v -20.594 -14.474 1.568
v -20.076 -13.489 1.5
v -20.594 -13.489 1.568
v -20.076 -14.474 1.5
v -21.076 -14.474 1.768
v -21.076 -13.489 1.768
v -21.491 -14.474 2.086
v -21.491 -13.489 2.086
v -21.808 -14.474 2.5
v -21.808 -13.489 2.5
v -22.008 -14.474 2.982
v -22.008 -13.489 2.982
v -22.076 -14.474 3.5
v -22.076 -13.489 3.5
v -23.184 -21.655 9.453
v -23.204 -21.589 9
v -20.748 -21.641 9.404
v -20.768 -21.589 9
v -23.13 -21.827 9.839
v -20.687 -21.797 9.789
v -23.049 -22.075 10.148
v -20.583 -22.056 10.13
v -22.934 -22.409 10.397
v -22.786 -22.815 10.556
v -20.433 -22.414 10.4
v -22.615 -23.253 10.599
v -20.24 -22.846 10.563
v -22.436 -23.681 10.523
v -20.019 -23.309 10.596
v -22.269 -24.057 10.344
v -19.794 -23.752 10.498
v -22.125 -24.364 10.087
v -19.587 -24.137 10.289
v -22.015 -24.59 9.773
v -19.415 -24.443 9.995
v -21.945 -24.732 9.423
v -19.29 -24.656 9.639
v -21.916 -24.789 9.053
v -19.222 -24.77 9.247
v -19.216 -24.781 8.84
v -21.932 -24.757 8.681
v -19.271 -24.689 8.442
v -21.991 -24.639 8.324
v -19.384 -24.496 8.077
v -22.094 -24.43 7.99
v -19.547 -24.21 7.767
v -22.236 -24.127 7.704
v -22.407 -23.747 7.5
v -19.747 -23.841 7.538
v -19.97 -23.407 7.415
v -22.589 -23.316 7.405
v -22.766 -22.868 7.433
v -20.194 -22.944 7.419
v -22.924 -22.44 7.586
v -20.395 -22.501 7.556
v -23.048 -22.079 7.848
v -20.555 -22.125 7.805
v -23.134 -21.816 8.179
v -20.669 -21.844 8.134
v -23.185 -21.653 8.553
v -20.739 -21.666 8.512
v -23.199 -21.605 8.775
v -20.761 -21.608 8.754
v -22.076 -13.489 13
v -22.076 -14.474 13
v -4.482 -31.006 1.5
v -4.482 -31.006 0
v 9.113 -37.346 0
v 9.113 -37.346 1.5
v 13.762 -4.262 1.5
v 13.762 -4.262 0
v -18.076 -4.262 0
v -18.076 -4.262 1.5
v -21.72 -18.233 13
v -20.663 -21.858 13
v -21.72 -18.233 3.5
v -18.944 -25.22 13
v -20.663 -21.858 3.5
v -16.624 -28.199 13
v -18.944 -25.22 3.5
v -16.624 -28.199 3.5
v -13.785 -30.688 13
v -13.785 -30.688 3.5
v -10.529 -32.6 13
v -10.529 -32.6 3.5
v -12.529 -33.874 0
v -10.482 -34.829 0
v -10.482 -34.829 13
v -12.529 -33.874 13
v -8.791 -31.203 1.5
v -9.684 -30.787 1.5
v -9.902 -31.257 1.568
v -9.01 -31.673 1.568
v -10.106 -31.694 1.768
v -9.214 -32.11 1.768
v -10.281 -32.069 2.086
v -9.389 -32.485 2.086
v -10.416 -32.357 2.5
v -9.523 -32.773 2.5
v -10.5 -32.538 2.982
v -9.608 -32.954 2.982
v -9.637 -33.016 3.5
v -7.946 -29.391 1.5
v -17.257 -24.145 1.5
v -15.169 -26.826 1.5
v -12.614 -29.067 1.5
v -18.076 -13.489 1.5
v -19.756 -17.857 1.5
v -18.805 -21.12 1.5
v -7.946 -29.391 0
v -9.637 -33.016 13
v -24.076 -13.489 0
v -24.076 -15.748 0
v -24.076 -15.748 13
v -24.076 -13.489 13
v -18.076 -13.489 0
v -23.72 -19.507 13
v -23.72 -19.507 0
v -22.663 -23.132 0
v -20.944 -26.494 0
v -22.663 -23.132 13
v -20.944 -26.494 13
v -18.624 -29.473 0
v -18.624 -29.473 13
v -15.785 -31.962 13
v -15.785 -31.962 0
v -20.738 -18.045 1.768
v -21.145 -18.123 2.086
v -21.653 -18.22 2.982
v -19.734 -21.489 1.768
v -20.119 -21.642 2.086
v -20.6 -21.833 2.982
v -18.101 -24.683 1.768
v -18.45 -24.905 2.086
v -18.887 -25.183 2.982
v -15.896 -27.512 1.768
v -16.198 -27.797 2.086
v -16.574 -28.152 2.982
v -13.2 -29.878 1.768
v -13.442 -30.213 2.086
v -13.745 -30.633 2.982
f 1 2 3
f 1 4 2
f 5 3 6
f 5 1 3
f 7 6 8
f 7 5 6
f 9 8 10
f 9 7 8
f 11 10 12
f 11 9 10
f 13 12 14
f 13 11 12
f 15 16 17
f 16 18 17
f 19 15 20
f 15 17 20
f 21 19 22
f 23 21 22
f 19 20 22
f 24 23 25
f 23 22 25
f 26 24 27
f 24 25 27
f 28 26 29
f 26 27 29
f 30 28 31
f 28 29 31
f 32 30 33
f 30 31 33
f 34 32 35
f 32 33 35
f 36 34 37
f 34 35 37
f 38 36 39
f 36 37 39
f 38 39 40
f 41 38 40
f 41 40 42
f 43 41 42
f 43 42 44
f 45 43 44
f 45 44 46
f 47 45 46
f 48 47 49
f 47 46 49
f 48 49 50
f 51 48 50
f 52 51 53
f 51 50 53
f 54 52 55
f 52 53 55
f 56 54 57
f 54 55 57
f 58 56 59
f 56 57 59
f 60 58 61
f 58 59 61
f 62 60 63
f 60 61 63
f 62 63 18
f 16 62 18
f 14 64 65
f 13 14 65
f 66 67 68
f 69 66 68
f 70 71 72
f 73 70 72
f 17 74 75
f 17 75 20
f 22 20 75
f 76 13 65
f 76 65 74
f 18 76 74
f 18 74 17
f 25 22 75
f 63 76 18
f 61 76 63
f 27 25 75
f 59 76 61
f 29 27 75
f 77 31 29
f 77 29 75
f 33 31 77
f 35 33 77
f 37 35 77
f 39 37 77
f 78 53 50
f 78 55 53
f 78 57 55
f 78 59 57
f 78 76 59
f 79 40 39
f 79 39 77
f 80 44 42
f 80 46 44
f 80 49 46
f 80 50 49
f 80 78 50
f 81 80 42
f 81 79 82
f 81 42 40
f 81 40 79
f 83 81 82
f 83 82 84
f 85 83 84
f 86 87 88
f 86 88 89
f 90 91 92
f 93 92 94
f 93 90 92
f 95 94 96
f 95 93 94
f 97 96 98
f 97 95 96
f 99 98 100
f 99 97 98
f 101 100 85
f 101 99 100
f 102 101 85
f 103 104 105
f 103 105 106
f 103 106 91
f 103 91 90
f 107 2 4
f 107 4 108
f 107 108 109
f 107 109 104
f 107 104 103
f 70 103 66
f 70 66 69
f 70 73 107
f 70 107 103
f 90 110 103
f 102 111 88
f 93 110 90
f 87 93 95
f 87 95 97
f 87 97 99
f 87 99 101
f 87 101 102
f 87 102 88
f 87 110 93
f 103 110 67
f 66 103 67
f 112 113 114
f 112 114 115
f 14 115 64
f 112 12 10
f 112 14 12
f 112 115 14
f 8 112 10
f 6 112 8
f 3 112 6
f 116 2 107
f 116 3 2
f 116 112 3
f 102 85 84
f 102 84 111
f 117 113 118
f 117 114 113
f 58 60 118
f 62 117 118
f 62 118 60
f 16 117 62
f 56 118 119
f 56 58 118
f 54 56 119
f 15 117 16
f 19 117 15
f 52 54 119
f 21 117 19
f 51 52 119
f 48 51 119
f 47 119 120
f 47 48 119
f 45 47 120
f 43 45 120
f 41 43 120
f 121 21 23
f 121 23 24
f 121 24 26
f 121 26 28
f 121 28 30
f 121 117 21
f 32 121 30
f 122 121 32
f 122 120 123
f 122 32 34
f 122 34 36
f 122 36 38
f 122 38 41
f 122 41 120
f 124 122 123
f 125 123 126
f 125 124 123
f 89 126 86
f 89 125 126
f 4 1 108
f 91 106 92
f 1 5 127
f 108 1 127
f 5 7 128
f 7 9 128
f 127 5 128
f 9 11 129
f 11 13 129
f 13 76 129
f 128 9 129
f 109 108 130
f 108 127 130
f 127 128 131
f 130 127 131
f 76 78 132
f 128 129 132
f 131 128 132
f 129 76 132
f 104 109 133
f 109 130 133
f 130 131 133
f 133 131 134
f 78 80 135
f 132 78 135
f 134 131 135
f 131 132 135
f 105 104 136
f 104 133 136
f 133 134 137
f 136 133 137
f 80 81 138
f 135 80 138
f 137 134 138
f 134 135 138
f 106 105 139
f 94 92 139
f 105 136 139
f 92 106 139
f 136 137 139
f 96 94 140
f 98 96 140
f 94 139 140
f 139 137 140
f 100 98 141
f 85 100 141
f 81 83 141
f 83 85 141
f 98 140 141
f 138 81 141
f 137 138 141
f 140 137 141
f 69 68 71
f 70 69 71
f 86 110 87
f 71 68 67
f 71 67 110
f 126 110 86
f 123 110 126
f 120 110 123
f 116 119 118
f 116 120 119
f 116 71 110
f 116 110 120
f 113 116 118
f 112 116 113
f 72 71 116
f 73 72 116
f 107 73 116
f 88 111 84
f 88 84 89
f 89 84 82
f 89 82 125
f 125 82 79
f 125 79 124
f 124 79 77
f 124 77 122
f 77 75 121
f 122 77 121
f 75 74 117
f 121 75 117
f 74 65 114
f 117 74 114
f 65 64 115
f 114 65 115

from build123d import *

# Parameters (mm, degrees)
BOSS_EXTRUDE1_DEPTH = 1.5
BOSS_EXTRUDE2_DEPTH = 13
CUT_EXTRUDE3_DEPTH  = 11.5
FILLET7_R           = 20
FILLET8_R           = 2
SKETCH5_R           = 1.6
CUT_EXTRUDE4_DEPTH  = 5.75


with BuildPart() as part:
    # Sketch1 → Boss-Extrude1 (new body)
    with BuildSketch(Plane.XY):
        Polygon((-4.481783153, -31.006256204), (9.112833652, -37.34553013), (13.762412955, -4.262054337), (-18.076399959, -4.262054337), (-18.076399959, -9.666982278), (-18.076399959, -24.666982278), align=None)
    extrude(amount=BOSS_EXTRUDE1_DEPTH)

    # Sketch2 → Boss-Extrude2 (add)
    with BuildSketch(Plane(origin=(0, 0, 0), x_dir=(-1, 0, 0), z_dir=(0, 0, -1))):
        Polygon((24.076399959, -28.489403843), (24.076399959, -13.489403843), (17.076399959, -13.489403843), (17.076399959, -24.029912017), (7.523455321, -28.48452326), (10.481783153, -34.828677769), align=None)
    extrude(amount=-BOSS_EXTRUDE2_DEPTH)

    # Sketch4 → Cut-Extrude3 (cut)
    with BuildSketch(Plane.XY.offset(13)):
        Polygon((-17.076399959, -13.489403843), (-22.076399959, -13.489403843), (-22.076399959, -27.215263321), (-9.63654663, -33.016062195), (-7.523455321, -28.48452326), (-17.076399959, -24.029912017), align=None)
    extrude(amount=-CUT_EXTRUDE3_DEPTH, mode=Mode.SUBTRACT)

    # Fillet7
    fillet7_edges = [part.edges().sort_by_distance(p)[0] for p in [
        (-24.076399959, -28.489403843, 6.5),
        (-22.076399959, -27.215263321, 7.25),
    ]]
    fillet(fillet7_edges, radius=FILLET7_R)

    # Fillet8
    fillet8_edges = [part.edges().sort_by_distance(p)[0] for p in [
        (-22.076399959, -13.981630974, 1.5),
        (-10.082655912, -32.808038021, 1.5),
        (-18.944228875, -25.219850272, 1.5),
    ]]
    fillet(fillet8_edges, radius=FILLET8_R)

    # Sketch5 → Cut-Extrude4 (cut, symmetric)
    with BuildSketch(Plane(origin=(-22.076399959, 0, 0), x_dir=(0, 0, -1), z_dir=(1, 0, 0))):
        with Locations(Location((-9, -23.189403843, 0), (0, 0, 90))):
            Circle(SKETCH5_R)
    extrude(amount=CUT_EXTRUDE4_DEPTH, both=True, mode=Mode.SUBTRACT)


solid = part.part
